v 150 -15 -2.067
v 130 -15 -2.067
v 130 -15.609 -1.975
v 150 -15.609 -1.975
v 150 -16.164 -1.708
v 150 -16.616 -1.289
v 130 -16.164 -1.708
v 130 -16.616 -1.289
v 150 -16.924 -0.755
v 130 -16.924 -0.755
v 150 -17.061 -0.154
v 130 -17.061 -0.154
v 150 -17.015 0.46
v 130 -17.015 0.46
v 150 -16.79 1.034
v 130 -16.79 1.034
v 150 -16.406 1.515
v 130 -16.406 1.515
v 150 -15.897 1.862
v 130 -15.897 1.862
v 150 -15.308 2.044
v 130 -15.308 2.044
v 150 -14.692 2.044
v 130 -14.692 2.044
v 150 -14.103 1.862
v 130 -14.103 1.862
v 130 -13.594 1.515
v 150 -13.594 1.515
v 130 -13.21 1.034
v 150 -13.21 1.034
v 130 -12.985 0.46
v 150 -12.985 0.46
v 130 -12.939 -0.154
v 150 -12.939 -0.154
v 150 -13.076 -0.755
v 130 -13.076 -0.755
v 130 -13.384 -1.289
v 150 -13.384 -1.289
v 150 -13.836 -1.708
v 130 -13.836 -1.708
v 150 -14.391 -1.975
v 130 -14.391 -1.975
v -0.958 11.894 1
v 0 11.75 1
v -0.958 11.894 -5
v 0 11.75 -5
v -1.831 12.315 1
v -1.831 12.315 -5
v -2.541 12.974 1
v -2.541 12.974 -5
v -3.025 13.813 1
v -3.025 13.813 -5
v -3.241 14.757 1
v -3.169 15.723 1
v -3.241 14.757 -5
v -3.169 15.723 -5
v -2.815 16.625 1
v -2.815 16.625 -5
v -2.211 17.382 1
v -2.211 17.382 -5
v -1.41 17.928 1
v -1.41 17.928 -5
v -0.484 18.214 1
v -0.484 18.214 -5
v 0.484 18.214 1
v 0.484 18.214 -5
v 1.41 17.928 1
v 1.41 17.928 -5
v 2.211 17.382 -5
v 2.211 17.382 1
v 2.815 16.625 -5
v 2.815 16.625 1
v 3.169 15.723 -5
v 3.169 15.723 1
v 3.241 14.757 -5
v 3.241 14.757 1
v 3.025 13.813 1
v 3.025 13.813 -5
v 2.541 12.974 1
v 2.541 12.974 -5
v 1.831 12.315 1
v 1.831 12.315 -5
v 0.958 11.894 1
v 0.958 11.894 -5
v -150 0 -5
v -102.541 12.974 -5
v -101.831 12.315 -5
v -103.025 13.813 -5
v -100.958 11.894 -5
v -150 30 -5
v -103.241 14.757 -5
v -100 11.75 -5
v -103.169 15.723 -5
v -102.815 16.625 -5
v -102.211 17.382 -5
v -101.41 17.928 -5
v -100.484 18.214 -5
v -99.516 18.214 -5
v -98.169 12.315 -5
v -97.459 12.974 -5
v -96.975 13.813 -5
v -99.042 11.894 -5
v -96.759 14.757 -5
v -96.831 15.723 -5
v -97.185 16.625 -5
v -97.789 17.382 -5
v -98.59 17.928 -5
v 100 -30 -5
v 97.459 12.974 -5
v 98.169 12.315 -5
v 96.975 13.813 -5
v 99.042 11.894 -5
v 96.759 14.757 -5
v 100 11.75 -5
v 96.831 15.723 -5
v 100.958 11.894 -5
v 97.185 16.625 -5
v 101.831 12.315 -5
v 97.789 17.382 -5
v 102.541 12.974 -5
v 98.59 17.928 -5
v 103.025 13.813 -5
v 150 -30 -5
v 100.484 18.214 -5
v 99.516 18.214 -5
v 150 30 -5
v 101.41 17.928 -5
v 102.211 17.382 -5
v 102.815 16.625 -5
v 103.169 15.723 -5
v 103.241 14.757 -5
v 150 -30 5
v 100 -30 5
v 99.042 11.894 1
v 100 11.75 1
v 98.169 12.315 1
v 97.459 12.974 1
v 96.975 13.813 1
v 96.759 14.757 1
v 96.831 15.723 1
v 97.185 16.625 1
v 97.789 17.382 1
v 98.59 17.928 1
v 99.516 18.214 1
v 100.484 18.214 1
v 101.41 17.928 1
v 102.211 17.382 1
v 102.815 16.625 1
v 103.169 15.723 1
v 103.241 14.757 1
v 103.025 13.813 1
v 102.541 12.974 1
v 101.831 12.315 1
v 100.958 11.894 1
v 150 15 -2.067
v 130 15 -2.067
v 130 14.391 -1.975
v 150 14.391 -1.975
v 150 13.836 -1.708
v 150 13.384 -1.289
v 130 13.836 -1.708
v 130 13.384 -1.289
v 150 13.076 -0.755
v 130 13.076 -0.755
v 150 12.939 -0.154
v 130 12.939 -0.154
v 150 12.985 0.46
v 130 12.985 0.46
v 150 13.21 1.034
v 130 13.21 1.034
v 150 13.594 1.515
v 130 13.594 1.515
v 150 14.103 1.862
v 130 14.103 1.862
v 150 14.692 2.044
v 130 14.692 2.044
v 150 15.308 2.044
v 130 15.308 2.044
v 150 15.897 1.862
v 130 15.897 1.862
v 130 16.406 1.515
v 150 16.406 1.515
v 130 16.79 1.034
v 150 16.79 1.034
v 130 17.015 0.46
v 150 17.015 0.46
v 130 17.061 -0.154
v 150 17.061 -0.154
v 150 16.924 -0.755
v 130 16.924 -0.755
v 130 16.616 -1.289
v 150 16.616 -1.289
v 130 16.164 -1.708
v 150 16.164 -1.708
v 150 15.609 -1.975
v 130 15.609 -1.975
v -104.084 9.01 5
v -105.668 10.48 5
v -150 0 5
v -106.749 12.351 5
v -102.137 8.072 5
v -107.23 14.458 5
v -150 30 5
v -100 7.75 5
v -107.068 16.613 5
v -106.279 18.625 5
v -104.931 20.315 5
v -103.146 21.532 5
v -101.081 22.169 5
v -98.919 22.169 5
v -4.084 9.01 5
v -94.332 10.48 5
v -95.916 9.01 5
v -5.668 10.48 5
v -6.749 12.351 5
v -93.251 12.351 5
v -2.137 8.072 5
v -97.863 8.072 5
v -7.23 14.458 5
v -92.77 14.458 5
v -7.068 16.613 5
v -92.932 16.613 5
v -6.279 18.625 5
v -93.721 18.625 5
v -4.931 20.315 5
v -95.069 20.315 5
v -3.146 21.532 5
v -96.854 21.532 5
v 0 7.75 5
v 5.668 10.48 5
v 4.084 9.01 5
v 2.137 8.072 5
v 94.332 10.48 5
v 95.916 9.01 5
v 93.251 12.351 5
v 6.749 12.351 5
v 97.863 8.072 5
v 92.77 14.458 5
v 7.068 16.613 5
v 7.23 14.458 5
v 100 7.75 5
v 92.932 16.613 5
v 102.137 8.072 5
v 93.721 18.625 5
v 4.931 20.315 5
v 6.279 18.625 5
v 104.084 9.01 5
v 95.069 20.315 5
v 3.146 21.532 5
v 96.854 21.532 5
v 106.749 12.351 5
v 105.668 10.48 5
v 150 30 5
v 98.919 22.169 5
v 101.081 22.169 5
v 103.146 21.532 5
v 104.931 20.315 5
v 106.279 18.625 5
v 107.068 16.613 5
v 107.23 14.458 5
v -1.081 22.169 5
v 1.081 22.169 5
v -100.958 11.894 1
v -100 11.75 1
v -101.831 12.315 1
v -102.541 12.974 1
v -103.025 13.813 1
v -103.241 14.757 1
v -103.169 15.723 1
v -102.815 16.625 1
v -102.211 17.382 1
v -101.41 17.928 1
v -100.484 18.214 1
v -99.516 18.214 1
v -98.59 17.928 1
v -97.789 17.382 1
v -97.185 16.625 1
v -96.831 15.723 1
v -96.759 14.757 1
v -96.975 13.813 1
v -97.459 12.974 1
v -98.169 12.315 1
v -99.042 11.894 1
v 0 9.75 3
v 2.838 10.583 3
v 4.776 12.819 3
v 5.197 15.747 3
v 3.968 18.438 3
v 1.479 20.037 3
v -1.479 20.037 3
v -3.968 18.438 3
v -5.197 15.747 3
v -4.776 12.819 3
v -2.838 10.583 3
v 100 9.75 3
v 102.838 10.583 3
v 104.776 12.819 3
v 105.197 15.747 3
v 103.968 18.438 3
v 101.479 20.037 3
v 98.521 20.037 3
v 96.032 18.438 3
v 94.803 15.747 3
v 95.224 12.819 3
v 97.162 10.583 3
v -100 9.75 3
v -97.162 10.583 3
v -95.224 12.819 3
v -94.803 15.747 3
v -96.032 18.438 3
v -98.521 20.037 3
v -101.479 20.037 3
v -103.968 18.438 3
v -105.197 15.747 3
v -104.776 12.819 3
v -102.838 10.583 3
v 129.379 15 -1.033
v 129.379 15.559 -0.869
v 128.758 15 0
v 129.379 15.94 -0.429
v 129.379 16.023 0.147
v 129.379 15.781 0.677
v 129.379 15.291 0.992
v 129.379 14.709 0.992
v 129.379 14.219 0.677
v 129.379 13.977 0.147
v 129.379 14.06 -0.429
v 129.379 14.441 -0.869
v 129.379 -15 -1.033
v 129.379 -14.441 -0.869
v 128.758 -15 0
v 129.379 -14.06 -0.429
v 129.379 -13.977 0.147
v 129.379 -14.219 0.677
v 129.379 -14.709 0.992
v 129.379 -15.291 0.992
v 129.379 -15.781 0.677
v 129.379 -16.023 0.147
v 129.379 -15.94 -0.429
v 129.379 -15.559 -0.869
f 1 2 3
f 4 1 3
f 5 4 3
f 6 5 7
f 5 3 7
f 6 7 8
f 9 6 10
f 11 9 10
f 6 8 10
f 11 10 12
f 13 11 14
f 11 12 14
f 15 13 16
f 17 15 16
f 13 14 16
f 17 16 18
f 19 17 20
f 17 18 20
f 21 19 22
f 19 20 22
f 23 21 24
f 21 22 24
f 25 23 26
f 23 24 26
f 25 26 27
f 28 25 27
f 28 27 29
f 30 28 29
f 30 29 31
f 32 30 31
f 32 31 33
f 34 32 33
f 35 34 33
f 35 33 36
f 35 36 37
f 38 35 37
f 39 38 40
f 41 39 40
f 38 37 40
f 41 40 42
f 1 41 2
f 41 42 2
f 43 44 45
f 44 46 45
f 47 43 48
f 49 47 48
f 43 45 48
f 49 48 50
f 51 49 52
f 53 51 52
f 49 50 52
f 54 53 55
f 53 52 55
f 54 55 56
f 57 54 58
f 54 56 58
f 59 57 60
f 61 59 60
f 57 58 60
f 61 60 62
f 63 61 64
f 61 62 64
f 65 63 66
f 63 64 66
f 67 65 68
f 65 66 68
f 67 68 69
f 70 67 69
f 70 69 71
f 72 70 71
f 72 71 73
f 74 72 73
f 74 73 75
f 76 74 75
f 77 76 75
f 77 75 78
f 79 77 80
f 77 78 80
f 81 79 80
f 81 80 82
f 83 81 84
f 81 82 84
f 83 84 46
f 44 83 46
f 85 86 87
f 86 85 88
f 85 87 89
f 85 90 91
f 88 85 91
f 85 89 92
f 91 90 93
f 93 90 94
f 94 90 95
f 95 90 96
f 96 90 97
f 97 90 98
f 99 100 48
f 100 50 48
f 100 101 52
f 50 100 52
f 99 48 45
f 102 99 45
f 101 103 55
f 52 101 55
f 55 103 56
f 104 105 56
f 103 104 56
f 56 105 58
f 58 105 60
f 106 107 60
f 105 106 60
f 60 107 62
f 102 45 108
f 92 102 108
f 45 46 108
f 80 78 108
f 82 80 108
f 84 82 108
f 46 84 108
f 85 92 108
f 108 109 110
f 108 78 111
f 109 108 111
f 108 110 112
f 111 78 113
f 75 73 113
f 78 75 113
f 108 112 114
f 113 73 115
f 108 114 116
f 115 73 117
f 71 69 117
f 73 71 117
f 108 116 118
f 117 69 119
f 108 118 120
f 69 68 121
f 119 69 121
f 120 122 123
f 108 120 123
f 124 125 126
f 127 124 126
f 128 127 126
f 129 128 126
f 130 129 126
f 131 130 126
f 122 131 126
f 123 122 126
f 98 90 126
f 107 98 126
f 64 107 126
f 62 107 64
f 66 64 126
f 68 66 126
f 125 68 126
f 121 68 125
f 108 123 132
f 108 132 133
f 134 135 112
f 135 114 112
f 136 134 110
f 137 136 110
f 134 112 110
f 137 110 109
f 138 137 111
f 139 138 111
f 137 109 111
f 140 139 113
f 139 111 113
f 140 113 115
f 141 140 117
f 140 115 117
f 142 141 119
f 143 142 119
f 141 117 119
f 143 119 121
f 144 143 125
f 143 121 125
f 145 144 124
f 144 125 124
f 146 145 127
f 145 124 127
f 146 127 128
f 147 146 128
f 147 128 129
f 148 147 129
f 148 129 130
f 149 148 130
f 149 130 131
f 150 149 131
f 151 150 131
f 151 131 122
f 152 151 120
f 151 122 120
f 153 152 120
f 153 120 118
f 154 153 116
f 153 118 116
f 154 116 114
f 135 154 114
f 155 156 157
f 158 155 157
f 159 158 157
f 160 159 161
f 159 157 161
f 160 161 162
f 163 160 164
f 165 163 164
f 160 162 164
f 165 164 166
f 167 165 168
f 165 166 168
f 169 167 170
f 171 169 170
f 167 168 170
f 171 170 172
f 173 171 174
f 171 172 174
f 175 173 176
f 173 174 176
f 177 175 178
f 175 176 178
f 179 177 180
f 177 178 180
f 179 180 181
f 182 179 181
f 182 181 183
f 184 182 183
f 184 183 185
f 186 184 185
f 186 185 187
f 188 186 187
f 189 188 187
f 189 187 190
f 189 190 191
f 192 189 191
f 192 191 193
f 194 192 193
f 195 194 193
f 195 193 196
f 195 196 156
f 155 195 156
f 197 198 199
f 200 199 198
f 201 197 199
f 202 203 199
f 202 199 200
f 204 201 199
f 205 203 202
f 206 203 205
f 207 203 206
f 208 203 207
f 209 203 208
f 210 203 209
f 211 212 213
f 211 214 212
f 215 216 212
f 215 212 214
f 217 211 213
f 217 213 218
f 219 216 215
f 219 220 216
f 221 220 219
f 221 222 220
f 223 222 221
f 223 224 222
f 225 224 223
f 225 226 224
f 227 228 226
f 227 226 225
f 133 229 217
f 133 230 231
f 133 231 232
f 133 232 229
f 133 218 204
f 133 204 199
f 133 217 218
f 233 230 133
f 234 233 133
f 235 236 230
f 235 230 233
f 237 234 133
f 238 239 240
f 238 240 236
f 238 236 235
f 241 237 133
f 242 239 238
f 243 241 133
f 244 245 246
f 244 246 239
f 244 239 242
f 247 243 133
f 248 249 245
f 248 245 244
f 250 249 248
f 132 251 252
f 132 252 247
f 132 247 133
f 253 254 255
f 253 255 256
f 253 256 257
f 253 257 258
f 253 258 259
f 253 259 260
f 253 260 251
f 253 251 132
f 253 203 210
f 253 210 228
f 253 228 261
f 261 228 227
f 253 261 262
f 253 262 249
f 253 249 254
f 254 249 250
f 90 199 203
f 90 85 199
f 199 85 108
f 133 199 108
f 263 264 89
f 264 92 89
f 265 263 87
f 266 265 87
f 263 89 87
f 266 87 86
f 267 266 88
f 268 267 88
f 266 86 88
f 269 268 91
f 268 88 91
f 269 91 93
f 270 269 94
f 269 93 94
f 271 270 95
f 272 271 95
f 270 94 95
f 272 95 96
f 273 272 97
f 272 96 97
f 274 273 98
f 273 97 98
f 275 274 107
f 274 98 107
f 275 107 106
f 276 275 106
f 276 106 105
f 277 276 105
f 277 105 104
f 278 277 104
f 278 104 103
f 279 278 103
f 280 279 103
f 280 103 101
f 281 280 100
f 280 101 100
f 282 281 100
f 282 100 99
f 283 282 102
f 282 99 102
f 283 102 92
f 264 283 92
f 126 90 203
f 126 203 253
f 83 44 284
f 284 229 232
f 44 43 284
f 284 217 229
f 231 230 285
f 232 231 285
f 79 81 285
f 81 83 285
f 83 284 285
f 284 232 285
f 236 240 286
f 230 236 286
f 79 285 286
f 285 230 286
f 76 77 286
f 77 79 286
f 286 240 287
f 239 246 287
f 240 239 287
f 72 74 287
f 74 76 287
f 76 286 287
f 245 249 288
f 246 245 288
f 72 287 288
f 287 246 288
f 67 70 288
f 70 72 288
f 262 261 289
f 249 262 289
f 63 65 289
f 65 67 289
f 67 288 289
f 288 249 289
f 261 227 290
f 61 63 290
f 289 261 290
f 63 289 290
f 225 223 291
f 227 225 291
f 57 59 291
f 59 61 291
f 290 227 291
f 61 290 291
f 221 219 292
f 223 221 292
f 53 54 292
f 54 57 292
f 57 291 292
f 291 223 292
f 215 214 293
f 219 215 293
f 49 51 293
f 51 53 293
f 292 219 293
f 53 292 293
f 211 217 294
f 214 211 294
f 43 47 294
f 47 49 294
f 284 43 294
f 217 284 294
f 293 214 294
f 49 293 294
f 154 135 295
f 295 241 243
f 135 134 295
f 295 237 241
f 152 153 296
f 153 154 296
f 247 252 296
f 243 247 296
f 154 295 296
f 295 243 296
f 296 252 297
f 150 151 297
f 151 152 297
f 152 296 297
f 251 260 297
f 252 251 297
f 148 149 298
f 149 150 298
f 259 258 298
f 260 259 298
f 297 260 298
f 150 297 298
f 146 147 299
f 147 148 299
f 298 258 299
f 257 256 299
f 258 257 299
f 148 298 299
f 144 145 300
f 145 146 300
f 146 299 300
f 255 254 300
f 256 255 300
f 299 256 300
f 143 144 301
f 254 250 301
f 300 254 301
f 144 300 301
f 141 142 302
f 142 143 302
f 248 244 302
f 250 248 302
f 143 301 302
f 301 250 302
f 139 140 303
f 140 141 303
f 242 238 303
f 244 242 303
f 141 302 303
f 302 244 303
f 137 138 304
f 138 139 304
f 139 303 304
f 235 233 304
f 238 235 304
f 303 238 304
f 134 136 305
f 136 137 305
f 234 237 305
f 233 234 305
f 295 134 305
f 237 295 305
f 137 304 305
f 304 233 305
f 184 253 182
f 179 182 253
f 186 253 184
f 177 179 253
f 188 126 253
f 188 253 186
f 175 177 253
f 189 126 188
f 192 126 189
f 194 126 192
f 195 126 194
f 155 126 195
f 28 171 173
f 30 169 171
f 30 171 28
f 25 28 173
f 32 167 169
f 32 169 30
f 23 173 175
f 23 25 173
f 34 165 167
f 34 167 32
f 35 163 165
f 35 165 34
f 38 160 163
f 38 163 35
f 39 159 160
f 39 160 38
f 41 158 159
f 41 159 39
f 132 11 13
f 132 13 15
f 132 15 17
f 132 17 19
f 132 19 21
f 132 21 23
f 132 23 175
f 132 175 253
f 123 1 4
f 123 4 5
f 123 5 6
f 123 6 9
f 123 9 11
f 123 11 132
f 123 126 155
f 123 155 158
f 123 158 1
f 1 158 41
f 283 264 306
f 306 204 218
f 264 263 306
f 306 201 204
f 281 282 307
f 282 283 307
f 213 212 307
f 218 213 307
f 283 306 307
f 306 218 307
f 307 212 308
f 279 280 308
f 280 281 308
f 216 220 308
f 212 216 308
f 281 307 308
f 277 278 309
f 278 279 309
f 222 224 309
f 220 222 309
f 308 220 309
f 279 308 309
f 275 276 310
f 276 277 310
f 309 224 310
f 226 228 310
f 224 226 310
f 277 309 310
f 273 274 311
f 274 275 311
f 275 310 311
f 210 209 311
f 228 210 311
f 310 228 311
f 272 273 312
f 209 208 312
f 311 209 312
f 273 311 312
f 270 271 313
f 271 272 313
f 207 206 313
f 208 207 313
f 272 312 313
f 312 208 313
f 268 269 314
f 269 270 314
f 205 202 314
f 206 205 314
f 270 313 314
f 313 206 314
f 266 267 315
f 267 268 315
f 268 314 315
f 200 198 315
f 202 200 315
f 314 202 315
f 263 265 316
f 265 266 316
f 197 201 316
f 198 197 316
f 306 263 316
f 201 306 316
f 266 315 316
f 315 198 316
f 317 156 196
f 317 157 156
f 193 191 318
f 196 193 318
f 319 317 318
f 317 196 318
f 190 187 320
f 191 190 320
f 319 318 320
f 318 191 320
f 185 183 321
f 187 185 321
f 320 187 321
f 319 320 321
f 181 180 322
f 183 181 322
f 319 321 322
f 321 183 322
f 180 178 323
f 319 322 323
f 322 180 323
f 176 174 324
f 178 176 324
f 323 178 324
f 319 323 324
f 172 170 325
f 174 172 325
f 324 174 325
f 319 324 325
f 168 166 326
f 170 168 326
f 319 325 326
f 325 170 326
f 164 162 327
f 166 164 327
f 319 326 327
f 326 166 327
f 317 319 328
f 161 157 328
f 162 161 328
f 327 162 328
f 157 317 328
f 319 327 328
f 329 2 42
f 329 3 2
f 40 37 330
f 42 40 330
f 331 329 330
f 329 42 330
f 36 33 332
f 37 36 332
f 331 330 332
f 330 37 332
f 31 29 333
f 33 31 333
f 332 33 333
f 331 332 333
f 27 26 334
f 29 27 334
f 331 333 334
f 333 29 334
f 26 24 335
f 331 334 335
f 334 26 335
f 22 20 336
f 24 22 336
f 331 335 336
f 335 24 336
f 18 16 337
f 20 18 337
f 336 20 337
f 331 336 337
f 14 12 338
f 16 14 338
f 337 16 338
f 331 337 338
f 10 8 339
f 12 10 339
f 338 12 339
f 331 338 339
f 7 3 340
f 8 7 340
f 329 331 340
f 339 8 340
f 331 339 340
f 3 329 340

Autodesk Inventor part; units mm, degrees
ref_plane "YZ Plane" through (0, 0, 0) normal (1, 0, 0) x (0, 1, 0)
ref_plane "XZ Plane" through (0, 0, 0) normal (0, 1, 0) x (-1, 0, 0)
ref_plane "XY Plane" through (0, 0, 0) normal (0, 0, 1) x (1, 0, 0)
sketch "Esboço1" plane through (0, 0, 0) normal (0, 0, 1) x (1, 0, 0)
  line L0 (-210, 0) -> (210, 0) construction
  line L1 (0, -42) -> (0, 42) construction
  line L2 (-150, 30) -> (150, 30)
  line L3 (150, 30) -> (150, -30)
  line L4 (150, -30) -> (-150, -30)
  line L5 (-150, -30) -> (-150, 30)
  line L6 (-150, 15) -> (150, 15) construction
  line L7 (-150, -15) -> (150, -15) construction
  line L8 (-150, 0) -> (100, -30)
  point P0 (0, 0)
  point P1 (-100, 15)
  point P2 (-100, -15)
  point P3 (100, 15)
  point P4 (100, -15)
  point P5 (0, 15)
  point P6 (0, -15)
  dimension "d0" = 60
  dimension "d1" = 300
  dimension "d2" = 30
  dimension "d3" = 100
  dimension "d24" = 250
extrude "Extrusão1" add sketch "Esboço1" along normal mid plane 10 contours L2 L3 L4 L8 L5
sketch "Esboço2" plane through (0, 0, 5) normal (0, 0, 1) x (1, 0, 0)
  point P0 (0, 0)
  point P1 (-100, 15)
  point P2 (-100, -15)
  point P3 (0, 15)
  point P4 (0, -15)
  point P5 (100, 15)
  point P6 (100, -15)
hole "Furo1" at (-100, 15, 5) at (0, 15, 5) at (100, 15, 5) direction (0, 0, -1) diameter 6.5 end through all countersink diameter 14.5 countersink angle 90 clearance for "Countersunk Flat Head Hex Socket Screw ISO 10642" size "M6" standard "ISO"
sketch "Esboço3" plane through (150, -30, 5) normal (1, 0, 0) x (0, 0, -1)
  line L0 (12, 30) -> (-2, 30) construction
  line L1 (5, -12) -> (5, 72) construction
  point P0 (5, 30)
  point P1 (5, 45)
  point P2 (5, 15)
  dimension "d16" = 30
hole "Furo2" at (150, 15, 0) at (150, -15, 0) direction (-1, 0, 0) diameter 4.134 depth 20 tip angle 118 thread size "M5x0.8" class "6H" standard "ISO Metric profile"
properties part number "Chapa Suporte 2R (Trilho Roletado)" material "Aluminio 1060"
